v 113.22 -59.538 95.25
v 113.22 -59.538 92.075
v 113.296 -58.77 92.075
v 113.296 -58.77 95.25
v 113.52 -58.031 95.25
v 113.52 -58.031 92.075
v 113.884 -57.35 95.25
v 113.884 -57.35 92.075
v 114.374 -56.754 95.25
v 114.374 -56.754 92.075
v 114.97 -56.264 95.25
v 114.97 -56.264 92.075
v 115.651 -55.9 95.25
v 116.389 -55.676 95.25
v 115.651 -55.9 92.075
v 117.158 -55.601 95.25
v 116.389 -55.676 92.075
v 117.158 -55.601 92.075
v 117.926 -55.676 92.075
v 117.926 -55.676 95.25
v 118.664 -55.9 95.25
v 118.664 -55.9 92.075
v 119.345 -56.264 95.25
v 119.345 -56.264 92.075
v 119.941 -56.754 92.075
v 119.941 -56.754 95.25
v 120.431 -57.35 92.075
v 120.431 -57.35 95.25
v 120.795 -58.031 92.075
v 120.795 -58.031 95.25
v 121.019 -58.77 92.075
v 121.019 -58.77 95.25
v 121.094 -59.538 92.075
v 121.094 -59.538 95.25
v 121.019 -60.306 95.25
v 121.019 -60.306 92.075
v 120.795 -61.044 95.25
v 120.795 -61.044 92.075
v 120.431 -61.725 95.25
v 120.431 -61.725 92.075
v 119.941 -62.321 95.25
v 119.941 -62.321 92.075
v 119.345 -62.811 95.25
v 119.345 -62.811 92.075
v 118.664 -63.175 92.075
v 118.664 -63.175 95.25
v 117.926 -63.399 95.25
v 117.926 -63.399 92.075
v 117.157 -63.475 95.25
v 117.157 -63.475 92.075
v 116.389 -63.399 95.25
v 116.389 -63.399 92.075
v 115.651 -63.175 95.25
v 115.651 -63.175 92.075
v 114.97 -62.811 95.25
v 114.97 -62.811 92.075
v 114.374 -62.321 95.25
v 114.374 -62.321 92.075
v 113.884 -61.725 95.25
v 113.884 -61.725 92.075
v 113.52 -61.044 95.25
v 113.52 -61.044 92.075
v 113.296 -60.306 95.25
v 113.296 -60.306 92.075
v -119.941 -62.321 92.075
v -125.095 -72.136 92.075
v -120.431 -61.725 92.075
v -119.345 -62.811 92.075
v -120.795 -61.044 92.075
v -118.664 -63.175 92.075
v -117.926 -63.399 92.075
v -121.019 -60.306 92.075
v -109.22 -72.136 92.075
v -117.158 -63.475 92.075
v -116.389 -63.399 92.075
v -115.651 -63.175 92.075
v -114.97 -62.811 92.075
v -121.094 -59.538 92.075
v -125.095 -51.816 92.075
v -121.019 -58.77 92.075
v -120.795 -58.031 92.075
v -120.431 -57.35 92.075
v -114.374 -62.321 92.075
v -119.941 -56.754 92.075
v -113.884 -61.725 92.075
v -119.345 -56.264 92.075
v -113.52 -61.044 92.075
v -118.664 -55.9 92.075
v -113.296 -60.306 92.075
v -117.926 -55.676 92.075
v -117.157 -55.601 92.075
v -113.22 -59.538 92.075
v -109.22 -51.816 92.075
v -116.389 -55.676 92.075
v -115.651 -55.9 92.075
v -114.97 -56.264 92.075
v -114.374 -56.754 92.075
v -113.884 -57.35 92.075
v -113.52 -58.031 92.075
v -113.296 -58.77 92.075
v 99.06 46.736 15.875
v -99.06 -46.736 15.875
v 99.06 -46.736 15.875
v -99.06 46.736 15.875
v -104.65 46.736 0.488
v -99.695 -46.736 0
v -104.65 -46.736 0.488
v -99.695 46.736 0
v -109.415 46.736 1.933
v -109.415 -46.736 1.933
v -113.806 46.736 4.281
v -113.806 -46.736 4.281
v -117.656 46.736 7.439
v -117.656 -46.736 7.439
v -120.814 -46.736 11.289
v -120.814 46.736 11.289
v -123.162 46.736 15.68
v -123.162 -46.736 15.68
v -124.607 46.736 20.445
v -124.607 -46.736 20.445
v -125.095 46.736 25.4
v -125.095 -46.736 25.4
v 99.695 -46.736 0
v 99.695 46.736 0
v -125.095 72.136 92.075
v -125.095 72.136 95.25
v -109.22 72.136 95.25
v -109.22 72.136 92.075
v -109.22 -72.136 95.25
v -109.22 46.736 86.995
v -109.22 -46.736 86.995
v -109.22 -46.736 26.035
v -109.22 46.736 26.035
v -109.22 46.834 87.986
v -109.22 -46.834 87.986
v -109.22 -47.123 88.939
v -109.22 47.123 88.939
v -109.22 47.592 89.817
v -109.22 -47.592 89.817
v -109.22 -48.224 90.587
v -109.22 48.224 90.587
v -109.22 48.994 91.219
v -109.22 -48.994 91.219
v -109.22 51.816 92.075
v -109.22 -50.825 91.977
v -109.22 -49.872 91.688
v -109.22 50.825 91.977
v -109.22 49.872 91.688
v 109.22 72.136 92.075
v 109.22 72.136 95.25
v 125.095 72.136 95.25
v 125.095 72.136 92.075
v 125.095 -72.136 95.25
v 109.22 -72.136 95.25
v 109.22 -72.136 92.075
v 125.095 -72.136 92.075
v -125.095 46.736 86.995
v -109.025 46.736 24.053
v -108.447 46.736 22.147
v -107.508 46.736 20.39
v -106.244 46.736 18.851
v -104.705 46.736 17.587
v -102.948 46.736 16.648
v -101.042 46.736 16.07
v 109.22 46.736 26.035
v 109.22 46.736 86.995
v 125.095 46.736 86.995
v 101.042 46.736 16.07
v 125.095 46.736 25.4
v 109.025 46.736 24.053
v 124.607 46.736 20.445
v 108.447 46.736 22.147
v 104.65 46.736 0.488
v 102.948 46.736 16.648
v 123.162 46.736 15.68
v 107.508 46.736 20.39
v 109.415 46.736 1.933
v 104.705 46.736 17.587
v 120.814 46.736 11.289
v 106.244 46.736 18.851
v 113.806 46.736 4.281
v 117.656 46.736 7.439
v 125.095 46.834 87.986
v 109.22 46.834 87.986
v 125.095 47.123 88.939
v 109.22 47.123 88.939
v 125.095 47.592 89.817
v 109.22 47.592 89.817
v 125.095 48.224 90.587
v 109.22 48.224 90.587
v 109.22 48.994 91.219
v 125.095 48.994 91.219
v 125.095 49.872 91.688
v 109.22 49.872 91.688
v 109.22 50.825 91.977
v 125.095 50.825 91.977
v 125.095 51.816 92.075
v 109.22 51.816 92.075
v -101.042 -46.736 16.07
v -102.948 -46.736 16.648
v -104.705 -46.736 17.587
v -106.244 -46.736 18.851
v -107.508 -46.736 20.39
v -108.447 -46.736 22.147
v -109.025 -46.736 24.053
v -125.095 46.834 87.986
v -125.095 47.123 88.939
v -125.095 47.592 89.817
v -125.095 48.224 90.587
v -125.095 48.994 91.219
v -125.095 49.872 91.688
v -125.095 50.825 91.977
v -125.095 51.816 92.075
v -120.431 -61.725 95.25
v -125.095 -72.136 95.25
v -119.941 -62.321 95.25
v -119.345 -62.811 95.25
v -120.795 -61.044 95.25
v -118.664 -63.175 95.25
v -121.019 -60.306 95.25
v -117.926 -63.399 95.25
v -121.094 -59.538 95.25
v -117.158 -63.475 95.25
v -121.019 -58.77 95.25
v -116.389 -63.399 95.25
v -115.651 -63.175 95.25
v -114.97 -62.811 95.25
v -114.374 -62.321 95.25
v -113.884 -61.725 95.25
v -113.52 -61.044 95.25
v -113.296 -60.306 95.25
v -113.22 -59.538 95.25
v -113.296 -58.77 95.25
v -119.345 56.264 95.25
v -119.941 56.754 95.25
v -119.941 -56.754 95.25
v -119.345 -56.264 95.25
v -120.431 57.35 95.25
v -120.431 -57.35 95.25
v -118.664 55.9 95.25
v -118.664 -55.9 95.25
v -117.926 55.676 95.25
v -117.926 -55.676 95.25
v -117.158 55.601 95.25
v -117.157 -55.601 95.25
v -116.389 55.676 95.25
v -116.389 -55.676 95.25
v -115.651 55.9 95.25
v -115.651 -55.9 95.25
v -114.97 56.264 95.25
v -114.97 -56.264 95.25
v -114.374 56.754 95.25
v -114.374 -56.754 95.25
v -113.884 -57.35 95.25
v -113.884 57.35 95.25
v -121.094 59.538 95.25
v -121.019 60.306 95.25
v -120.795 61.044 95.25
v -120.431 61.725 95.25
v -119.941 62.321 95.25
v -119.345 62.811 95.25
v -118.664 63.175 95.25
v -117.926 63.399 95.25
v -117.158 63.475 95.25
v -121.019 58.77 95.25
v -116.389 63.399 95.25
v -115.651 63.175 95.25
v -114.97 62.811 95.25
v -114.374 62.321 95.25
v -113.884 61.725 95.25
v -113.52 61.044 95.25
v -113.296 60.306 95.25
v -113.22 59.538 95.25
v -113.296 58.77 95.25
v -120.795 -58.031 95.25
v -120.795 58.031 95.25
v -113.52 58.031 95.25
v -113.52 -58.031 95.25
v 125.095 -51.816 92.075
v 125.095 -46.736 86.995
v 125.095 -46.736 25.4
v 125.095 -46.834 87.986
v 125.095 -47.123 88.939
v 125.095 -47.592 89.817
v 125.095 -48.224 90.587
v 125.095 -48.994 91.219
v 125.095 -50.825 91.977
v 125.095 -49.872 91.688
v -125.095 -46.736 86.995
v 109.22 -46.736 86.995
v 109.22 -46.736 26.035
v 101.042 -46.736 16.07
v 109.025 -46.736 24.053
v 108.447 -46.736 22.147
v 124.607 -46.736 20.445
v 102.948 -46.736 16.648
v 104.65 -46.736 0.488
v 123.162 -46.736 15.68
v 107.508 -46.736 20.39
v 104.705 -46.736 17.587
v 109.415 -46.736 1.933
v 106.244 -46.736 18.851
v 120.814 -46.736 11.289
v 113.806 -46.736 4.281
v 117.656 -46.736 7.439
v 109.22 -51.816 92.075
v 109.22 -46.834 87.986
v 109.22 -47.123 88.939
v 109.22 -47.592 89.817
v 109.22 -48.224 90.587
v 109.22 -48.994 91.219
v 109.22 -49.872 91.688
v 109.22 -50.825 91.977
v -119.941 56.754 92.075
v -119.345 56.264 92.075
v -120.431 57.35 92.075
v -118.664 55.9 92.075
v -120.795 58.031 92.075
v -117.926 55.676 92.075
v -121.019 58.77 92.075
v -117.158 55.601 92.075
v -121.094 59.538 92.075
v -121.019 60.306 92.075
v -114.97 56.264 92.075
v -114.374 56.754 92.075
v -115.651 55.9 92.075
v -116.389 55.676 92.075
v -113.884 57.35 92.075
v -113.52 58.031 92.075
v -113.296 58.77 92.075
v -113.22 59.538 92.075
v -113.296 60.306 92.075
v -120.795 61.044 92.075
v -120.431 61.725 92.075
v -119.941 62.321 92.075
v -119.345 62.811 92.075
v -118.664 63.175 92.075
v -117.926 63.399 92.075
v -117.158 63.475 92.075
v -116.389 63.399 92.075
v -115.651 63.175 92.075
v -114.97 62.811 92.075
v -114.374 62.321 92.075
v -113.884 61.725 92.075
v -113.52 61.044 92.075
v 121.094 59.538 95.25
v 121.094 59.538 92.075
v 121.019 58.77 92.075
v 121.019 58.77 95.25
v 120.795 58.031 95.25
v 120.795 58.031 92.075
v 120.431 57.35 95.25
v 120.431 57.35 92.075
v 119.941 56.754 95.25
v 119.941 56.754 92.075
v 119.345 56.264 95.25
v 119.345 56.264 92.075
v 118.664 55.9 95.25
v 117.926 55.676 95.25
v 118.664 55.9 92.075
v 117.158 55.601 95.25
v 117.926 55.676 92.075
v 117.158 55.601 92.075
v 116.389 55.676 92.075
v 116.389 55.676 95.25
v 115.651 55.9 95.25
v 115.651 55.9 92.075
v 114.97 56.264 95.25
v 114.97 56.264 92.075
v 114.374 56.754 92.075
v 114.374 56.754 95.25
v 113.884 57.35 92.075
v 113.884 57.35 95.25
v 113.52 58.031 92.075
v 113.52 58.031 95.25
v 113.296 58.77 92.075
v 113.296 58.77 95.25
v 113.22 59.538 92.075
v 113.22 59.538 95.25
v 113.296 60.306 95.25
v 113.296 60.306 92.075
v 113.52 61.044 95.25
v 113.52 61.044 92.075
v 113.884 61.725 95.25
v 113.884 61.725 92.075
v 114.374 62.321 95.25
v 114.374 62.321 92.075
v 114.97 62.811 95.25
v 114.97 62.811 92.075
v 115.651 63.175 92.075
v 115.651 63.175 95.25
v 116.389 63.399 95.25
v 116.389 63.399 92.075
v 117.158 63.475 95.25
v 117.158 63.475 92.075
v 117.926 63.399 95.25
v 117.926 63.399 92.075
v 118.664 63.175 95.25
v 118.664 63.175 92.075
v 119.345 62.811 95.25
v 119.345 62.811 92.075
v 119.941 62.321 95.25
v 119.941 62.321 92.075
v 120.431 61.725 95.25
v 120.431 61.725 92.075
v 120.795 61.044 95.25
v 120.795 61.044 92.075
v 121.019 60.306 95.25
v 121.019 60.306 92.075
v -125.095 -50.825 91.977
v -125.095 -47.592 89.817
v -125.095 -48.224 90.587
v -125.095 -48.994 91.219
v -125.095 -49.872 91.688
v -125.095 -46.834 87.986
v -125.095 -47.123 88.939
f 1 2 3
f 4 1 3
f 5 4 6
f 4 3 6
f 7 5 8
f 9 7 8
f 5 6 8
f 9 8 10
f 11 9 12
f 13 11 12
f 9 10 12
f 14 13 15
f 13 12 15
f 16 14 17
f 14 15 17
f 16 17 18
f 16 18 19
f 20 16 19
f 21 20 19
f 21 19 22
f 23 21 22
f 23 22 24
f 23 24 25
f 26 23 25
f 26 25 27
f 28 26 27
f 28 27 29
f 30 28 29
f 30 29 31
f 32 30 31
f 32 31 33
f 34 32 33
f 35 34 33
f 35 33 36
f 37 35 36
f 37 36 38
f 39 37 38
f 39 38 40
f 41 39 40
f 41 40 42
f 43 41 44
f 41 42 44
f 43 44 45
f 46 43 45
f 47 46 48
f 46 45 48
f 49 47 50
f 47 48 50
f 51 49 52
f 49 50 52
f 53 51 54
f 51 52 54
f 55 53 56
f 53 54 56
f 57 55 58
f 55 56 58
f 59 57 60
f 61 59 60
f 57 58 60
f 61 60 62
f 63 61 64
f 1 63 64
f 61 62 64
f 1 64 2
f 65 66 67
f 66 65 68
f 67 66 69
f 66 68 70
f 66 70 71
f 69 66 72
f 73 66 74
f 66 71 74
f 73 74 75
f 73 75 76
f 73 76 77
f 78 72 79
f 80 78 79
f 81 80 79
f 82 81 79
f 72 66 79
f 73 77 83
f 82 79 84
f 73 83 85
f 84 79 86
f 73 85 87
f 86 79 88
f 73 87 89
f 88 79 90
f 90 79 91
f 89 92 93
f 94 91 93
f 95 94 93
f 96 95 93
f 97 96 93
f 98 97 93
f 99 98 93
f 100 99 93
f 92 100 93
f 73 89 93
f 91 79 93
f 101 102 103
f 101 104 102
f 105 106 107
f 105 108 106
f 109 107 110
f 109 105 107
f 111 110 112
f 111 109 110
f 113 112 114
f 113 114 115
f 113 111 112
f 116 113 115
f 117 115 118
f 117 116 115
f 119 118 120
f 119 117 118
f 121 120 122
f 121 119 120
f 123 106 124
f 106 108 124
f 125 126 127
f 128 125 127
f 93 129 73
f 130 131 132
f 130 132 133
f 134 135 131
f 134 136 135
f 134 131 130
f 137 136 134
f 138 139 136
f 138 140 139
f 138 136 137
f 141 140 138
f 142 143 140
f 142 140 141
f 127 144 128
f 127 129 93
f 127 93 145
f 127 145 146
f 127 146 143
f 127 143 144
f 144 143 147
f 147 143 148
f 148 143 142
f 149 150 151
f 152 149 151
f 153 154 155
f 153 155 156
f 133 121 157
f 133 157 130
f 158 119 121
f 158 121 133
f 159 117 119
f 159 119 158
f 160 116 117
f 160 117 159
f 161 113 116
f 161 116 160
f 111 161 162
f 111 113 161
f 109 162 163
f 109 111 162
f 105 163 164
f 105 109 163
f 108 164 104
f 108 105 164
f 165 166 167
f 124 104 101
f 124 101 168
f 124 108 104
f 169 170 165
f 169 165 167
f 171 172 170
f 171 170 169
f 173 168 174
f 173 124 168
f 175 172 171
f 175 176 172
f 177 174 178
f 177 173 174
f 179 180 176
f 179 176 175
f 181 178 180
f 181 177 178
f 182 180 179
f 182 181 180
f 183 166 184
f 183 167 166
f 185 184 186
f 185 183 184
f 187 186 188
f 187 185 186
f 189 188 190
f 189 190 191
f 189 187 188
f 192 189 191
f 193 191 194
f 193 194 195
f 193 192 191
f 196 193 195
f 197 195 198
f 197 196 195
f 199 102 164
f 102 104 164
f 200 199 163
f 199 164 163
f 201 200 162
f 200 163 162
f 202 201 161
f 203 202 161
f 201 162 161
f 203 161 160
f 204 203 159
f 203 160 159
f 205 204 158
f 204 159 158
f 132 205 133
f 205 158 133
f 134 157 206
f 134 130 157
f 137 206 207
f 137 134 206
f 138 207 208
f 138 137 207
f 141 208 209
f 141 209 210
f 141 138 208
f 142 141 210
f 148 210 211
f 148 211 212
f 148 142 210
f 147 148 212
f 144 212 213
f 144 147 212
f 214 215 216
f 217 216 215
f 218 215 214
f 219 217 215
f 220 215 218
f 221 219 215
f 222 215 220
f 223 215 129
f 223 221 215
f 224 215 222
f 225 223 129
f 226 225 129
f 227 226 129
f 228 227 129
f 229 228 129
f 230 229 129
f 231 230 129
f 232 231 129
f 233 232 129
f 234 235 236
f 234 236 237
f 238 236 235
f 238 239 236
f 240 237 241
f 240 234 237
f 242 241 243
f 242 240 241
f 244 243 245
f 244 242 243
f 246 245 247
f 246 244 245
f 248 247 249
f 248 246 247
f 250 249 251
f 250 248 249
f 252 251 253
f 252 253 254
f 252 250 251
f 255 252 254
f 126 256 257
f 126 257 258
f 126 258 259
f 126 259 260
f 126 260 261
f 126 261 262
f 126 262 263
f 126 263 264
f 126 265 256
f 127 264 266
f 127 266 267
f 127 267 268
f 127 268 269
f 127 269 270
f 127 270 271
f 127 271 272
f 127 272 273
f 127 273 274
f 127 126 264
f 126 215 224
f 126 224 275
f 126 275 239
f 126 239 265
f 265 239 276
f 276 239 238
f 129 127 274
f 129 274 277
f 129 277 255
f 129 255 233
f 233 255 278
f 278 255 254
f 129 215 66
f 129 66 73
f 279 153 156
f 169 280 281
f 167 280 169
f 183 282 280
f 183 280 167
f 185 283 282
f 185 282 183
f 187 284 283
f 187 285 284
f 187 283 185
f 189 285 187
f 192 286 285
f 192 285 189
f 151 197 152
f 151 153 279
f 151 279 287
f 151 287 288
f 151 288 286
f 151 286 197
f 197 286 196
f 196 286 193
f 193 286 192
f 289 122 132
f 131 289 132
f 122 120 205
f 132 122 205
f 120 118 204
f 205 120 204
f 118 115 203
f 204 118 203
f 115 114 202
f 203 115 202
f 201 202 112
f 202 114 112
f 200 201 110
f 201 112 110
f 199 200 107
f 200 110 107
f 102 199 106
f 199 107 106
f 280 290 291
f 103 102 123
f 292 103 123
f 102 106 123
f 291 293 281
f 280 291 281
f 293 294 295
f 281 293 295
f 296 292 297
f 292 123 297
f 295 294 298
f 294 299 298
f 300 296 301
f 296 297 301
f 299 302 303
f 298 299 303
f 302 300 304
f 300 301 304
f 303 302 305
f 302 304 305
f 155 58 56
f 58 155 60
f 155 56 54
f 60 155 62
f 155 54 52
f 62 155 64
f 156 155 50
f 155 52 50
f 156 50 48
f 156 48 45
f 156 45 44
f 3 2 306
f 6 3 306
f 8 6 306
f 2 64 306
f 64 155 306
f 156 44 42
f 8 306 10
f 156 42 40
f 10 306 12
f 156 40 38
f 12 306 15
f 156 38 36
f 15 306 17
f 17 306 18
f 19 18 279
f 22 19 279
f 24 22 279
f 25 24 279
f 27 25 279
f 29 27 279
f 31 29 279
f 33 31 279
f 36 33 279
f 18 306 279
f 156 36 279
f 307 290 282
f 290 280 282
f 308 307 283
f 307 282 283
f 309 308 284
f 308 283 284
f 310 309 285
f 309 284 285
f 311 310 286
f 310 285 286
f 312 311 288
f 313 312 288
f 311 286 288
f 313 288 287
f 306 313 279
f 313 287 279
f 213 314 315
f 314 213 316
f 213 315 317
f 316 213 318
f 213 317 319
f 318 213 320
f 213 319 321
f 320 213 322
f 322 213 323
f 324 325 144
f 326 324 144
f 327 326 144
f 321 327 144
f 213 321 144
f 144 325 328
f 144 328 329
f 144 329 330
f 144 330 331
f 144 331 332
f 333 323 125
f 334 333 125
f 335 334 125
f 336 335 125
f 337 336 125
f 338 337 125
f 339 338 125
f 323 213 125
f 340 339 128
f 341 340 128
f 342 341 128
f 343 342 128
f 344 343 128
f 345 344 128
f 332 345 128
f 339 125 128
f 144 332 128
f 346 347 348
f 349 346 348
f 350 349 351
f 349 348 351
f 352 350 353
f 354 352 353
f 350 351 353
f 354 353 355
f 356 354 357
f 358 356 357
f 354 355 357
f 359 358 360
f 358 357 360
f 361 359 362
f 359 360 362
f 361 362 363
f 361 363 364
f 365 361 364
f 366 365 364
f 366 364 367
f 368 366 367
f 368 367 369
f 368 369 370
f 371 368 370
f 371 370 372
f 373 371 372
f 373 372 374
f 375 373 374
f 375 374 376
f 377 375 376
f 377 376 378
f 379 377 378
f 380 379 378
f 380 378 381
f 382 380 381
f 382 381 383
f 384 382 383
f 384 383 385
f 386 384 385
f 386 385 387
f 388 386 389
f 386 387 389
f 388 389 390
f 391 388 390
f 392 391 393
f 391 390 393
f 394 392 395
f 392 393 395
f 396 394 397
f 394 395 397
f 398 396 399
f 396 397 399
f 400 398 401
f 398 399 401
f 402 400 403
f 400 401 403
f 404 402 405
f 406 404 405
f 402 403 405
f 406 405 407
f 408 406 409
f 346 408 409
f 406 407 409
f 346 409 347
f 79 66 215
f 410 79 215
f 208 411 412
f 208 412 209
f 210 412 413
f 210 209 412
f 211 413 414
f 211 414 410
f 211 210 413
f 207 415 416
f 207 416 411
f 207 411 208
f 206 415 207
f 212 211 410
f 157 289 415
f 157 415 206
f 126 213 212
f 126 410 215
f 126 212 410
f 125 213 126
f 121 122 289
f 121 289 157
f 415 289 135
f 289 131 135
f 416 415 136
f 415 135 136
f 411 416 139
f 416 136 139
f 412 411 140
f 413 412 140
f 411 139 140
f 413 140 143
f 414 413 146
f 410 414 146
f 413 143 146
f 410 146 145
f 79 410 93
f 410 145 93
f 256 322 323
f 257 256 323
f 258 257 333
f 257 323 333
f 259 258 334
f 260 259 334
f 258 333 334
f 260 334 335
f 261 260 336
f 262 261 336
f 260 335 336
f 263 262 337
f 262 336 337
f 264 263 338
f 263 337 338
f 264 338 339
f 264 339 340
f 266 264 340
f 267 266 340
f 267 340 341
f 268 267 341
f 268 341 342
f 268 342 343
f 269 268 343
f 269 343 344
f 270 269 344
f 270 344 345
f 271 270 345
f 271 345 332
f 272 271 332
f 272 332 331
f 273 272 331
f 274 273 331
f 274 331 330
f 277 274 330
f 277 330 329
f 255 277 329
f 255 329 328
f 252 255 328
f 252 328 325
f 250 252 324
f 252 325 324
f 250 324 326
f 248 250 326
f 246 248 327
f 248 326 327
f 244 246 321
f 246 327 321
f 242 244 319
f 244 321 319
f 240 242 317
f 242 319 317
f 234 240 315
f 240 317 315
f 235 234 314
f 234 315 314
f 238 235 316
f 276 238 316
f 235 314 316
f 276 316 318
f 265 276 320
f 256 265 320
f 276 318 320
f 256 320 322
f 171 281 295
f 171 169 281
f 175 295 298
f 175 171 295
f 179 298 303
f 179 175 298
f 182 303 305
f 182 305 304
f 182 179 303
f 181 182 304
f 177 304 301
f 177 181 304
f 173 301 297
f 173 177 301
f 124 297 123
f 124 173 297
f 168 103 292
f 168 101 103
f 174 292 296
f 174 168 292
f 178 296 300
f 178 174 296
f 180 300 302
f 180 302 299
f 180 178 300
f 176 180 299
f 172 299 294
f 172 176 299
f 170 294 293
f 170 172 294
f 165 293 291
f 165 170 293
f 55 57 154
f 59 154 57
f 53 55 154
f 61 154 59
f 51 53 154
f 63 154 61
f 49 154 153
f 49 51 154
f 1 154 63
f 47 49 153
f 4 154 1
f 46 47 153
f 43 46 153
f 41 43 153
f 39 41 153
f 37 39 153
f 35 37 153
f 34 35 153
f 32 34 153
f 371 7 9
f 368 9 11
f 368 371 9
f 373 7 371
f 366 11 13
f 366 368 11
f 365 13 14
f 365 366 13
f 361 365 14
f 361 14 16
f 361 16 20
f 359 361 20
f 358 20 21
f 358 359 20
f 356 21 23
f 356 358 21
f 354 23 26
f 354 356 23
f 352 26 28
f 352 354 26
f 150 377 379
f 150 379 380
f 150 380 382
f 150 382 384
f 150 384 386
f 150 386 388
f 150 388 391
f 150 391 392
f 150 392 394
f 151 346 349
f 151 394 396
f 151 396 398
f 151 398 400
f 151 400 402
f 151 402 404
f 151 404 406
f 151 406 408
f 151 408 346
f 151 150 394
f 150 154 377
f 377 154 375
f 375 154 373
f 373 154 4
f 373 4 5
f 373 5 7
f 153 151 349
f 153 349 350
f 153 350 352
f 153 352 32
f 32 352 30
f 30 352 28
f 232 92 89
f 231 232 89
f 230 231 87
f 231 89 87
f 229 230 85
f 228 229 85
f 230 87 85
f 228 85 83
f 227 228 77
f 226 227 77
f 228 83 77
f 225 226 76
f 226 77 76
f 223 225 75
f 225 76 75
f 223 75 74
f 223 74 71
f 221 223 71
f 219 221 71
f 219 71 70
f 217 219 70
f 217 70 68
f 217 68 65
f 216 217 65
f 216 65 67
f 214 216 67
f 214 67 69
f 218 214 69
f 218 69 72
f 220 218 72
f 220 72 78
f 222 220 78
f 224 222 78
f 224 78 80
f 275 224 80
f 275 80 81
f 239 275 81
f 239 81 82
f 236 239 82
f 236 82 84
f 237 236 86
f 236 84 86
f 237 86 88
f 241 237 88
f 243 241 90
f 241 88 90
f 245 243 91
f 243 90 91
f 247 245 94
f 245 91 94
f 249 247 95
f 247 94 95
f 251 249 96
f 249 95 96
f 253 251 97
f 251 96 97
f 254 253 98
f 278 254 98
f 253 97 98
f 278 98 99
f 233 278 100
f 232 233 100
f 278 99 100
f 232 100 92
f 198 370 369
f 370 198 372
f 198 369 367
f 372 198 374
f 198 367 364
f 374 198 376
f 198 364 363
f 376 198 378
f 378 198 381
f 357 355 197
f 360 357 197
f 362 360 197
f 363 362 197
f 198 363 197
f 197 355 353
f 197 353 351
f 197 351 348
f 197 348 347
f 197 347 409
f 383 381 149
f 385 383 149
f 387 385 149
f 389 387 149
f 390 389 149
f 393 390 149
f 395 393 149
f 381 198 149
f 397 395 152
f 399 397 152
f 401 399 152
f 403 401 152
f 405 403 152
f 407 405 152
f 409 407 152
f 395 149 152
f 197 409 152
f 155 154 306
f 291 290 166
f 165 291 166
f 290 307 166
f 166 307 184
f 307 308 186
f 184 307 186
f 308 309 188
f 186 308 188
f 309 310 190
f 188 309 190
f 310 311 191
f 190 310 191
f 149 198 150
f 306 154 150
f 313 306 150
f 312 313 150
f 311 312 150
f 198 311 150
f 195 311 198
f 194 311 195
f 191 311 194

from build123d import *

# Parameters (mm, degrees)
SKETCH1_W           = 250.19
SKETCH1_H           = 93.472
BOSS_EXTRUDE1_DEPTH = 95.25
SKETCH5_W           = 218.44
SKETCH5_H           = 93.472
CUT_EXTRUDE1_DEPTH  = 79.375
SKETCH6_W           = 15.875
SKETCH6_H           = 25.4
BOSS_EXTRUDE2_DEPTH = 3.175
SKETCH7_R           = 3.937
CUT_EXTRUDE2_DEPTH  = 172.26052419
FILLET1_R           = 25.4
FILLET2_R           = 25.4
FILLET3_R           = 5.08
FILLET4_R           = 5.08
FILLET5_R           = 5.08
FILLET6_R           = 5.08
FILLET7_R           = 10.16
FILLET8_R           = 10.16


with BuildPart() as part:
    # Sketch1 → Boss-Extrude1 (new body)
    with BuildSketch(Plane.XY):
        Rectangle(SKETCH1_W, SKETCH1_H)
    extrude(amount=BOSS_EXTRUDE1_DEPTH)

    # Sketch5 → Cut-Extrude1 (cut)
    with BuildSketch(Plane.XY.offset(95.25)):
        Rectangle(SKETCH5_W, SKETCH5_H)
    extrude(amount=-CUT_EXTRUDE1_DEPTH, mode=Mode.SUBTRACT)

    # Sketch6 → Boss-Extrude2 (add)
    with BuildSketch(Plane.XY.offset(95.25)):
        with Locations((117.1575, 59.436)):
            Rectangle(SKETCH6_W, SKETCH6_H)
        with Locations((-117.1575, 59.436)):
            Rectangle(SKETCH6_W, SKETCH6_H)
        with Locations((117.1575, -59.436)):
            Rectangle(SKETCH6_W, SKETCH6_H)
        with Locations((-117.1575, -59.436)):
            Rectangle(SKETCH6_W, SKETCH6_H)
    extrude(amount=-BOSS_EXTRUDE2_DEPTH)

    # Sketch7 → Cut-Extrude2 (cut, through all)
    with BuildSketch(Plane(origin=(0, 0, 92.075), x_dir=(-1, 0, 0), z_dir=(0, 0, -1))):
        with Locations((117.1575, 59.5376)):
            Circle(SKETCH7_R)
        with Locations(Location((-117.1575, 59.5376, 0), (0, 0, 180))):
            Circle(SKETCH7_R)
        with Locations(Location((117.1575, -59.5376, 0), (0, 0, 180))):
            Circle(SKETCH7_R)
        with Locations((-117.1575, -59.5376)):
            Circle(SKETCH7_R)
    extrude(amount=-CUT_EXTRUDE2_DEPTH, mode=Mode.SUBTRACT)

    # Fillet1
    fillet1_edges = [part.edges().sort_by_distance(p)[0] for p in [
        (125.095, 0, 0),
    ]]
    fillet(fillet1_edges, radius=FILLET1_R)

    # Fillet2
    fillet2_edges = [part.edges().sort_by_distance(p)[0] for p in [
        (-125.095, 0, 0),
    ]]
    fillet(fillet2_edges, radius=FILLET2_R)

    # Fillet3
    fillet3_edges = [part.edges().sort_by_distance(p)[0] for p in [
        (117.1575, 46.736, 92.075),
    ]]
    fillet(fillet3_edges, radius=FILLET3_R)

    # Fillet4
    fillet4_edges = [part.edges().sort_by_distance(p)[0] for p in [
        (-117.1575, 46.736, 92.075),
    ]]
    fillet(fillet4_edges, radius=FILLET4_R)

    # Fillet5
    fillet5_edges = [part.edges().sort_by_distance(p)[0] for p in [
        (-117.1575, -46.736, 92.075),
    ]]
    fillet(fillet5_edges, radius=FILLET5_R)

    # Fillet6
    fillet6_edges = [part.edges().sort_by_distance(p)[0] for p in [
        (117.1575, -46.736, 92.075),
    ]]
    fillet(fillet6_edges, radius=FILLET6_R)

    # Fillet7
    fillet7_edges = [part.edges().sort_by_distance(p)[0] for p in [
        (-109.22, 0, 15.875),
    ]]
    fillet(fillet7_edges, radius=FILLET7_R)

    # Fillet8
    fillet8_edges = [part.edges().sort_by_distance(p)[0] for p in [
        (109.22, 0, 15.875),
    ]]
    fillet(fillet8_edges, radius=FILLET8_R)


solid = part.part
